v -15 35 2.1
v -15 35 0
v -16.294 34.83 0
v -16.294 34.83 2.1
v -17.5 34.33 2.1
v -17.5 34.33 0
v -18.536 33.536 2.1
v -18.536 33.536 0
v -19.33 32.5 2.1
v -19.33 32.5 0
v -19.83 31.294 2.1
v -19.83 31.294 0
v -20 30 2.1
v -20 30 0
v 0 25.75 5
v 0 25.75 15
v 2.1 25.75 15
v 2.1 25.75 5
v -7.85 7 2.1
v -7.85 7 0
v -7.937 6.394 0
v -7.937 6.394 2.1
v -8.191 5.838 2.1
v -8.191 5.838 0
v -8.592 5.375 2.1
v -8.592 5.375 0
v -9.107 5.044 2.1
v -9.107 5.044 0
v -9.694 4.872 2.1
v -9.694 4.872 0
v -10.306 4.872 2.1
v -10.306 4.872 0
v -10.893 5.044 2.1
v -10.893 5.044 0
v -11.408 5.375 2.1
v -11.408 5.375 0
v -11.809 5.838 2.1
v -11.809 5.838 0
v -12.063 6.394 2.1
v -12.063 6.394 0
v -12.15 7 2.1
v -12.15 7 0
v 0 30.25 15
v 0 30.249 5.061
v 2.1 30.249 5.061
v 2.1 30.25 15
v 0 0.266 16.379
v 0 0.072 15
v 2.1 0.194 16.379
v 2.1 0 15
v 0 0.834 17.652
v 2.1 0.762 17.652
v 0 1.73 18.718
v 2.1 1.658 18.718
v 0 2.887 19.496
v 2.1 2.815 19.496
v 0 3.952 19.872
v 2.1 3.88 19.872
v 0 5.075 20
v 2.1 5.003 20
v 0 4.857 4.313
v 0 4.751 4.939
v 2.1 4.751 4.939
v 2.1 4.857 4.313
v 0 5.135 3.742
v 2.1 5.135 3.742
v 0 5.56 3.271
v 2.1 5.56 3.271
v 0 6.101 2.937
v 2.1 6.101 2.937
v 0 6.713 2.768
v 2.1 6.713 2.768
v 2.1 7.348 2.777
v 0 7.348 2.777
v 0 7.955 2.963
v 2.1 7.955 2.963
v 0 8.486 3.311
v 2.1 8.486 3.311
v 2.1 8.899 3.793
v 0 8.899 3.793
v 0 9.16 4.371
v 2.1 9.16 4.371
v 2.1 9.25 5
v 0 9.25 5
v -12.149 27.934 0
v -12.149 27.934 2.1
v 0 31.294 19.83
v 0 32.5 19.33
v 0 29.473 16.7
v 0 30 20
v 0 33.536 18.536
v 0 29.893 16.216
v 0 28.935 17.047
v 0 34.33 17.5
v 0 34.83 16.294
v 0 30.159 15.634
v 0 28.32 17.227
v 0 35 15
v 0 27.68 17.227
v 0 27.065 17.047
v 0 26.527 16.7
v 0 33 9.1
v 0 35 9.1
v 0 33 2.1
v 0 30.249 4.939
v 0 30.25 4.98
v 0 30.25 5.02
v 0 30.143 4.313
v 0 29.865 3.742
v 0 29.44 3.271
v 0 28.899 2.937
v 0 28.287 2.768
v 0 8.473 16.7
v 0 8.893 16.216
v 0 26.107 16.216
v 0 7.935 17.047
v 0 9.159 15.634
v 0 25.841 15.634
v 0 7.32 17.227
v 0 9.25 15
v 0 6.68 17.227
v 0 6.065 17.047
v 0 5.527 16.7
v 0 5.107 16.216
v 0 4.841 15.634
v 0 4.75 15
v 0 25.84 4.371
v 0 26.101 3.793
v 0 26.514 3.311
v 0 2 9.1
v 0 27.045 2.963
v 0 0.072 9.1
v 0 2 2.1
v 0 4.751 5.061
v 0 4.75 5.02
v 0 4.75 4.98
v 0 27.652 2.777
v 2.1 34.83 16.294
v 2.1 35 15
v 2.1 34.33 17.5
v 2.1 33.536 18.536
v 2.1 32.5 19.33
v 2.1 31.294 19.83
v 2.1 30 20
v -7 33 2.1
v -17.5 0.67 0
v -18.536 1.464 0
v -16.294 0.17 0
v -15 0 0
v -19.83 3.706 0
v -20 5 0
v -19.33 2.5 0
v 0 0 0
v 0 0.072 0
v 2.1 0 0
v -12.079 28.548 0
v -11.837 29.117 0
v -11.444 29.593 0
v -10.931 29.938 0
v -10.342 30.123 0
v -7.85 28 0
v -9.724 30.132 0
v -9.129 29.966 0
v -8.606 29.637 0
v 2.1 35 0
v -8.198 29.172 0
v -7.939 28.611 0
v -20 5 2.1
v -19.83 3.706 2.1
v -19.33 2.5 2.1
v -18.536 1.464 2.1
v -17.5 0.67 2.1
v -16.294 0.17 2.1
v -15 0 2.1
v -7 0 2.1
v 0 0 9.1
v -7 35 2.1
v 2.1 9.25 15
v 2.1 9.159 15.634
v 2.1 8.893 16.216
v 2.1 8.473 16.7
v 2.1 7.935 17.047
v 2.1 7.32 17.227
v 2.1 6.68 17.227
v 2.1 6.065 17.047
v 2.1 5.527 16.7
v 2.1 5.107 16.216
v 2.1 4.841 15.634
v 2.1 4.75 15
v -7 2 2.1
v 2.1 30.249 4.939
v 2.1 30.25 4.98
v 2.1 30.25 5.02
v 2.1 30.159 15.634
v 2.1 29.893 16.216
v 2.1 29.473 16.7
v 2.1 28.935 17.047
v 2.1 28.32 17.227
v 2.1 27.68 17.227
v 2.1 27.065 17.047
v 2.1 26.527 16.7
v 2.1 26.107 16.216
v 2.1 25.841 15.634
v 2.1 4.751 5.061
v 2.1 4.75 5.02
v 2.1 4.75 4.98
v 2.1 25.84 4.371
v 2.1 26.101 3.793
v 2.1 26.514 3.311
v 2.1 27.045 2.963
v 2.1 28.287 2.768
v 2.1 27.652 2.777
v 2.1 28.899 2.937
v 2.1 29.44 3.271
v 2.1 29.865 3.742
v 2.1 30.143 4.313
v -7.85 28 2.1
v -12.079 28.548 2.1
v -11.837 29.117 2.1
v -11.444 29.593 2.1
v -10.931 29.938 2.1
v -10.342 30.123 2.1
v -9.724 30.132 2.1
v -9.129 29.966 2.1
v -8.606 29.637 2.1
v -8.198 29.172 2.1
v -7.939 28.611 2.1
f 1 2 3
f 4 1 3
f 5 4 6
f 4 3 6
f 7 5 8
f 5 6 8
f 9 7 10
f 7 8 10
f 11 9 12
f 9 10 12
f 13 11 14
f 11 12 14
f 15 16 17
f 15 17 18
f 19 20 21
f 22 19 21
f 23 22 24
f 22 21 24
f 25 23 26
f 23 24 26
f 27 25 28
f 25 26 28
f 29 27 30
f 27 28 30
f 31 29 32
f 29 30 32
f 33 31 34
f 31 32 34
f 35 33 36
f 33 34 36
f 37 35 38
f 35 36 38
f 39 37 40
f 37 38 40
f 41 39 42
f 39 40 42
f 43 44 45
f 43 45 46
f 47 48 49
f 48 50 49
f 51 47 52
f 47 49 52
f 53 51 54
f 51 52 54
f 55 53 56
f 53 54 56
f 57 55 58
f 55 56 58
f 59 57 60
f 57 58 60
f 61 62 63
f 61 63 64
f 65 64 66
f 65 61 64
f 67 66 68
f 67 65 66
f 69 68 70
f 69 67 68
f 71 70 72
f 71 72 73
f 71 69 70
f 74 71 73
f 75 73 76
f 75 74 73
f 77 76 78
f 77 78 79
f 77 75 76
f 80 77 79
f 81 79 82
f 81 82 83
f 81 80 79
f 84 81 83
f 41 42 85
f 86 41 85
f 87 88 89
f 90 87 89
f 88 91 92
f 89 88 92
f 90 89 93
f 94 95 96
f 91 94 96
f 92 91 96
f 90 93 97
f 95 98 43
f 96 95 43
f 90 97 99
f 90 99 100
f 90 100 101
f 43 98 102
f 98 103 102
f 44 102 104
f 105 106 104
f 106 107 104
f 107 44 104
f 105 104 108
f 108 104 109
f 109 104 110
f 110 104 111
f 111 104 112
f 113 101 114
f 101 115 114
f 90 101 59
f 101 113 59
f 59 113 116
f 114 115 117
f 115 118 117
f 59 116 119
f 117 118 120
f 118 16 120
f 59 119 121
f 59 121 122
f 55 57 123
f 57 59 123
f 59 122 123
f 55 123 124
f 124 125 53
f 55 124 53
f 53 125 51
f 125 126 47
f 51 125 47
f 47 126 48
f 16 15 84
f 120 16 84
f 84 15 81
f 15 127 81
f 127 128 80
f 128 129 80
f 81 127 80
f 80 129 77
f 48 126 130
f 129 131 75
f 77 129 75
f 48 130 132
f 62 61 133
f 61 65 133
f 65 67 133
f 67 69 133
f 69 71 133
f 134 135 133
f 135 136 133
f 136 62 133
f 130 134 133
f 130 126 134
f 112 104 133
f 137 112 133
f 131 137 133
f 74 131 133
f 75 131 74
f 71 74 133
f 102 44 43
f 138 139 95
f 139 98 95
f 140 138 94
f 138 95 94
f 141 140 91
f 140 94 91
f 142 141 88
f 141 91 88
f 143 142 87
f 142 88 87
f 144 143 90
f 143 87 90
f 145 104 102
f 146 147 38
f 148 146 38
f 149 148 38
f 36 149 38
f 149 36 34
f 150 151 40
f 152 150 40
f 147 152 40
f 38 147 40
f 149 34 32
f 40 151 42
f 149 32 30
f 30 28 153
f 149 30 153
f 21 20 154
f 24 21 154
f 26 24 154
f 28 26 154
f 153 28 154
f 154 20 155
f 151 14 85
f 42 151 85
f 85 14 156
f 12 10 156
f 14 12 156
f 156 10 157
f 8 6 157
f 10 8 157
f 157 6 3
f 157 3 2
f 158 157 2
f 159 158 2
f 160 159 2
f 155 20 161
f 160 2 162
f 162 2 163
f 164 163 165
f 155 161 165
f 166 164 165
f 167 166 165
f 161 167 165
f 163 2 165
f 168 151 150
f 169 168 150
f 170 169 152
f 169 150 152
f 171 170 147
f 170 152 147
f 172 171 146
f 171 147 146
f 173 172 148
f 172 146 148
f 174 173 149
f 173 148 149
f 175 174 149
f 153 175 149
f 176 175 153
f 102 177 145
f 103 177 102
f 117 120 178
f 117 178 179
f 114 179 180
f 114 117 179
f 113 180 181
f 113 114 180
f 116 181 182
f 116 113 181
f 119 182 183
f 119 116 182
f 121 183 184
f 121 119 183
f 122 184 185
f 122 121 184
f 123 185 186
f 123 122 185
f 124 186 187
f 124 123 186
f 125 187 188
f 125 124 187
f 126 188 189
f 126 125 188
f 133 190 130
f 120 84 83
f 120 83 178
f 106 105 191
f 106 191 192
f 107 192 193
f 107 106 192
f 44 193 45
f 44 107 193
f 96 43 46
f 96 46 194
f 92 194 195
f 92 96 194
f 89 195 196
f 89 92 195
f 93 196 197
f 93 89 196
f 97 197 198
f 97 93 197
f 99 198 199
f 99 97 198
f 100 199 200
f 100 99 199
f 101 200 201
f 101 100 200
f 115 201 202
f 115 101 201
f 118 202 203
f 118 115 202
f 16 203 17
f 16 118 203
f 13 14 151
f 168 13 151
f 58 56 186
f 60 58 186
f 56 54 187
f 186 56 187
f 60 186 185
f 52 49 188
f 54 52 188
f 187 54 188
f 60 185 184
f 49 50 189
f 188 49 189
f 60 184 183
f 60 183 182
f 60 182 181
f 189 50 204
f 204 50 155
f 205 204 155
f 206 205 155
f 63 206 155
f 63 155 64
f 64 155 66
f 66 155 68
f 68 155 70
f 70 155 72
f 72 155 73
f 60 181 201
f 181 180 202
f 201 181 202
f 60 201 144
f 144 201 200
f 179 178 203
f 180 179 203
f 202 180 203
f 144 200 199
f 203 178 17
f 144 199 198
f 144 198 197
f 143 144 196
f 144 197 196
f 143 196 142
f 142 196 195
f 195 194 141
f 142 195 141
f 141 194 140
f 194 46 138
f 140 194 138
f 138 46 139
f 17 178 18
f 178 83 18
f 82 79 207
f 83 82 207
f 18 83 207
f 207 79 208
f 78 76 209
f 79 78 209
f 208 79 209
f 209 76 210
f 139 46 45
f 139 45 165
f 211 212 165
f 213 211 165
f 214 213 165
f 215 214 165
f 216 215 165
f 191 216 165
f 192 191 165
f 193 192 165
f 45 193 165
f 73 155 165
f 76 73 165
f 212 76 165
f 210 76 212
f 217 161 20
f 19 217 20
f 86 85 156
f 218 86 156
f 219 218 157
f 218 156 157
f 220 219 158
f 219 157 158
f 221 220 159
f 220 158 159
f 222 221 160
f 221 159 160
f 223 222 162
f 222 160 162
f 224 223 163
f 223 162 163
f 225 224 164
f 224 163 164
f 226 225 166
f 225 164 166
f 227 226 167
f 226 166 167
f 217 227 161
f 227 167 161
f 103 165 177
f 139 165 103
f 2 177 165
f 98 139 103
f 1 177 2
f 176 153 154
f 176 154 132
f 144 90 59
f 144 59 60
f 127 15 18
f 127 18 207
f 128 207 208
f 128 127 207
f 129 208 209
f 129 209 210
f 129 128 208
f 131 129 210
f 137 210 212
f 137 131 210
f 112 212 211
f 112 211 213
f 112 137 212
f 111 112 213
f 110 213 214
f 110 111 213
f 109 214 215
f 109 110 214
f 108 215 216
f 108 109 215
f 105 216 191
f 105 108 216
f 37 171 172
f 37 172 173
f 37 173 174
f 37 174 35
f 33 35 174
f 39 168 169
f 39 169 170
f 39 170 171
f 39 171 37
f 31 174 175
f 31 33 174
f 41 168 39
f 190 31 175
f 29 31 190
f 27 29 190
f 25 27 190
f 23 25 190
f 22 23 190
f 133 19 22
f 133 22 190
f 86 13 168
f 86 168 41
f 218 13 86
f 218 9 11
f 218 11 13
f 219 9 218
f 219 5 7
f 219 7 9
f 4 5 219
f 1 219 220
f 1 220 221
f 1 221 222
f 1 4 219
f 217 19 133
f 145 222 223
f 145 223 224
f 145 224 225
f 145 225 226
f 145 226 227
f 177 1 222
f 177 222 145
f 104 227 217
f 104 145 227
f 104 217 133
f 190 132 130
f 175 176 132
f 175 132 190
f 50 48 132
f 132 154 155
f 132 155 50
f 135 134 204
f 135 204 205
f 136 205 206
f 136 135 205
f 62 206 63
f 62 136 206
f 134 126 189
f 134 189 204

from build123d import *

# Parameters (mm, degrees)
F1_DEPTH  = 2.1
F3_DEPTH  = 20
F5_DEPTH  = 2.1
F6_R      = 5
F8_DEPTH  = 2
F11_DEPTH = 2


with BuildPart() as f1:
    # F0 (on Top) → F1 (new body)
    with BuildSketch(Plane.XY):
        with BuildLine():
            Line((-15, 0), (0, 0))
            Line((0, 0), (0, 35))
            Line((0, 35), (-15, 35))
            ThreePointArc((-15, 35), (-18.5355339059, 33.5355339059), (-20, 30))
            Line((-20, 30), (-20, 5))
            ThreePointArc((-20, 5), (-18.5355339059, 1.4644660941), (-15, 0))
        make_face()
        with BuildLine():
            ThreePointArc((-12.1489869425, 27.9340066588), (-10.0330005573, 30.1497467207), (-7.85, 27.9999999982))
            Line((-7.85, 27.9999999982), (-7.8500000178, 7))
            ThreePointArc((-7.8500000178, 7), (-10.0000000178, 4.85), (-12.1500000178, 7))
            ThreePointArc((-12.1500000178, 7), (-12.1500000172, 7.0000520234), (-12.1500000153, 7.0001040468))
            Line((-12.1500000153, 7.0001040468), (-12.1489869425, 27.9340066588))
        make_face(mode=Mode.SUBTRACT)
    extrude(amount=F1_DEPTH)

    # F2 (on Top) → F3 (join)
    with BuildSketch(Plane.XY):
        Polygon((0, 35), (0, 0.0720546025), (2.1, 0), (2.1, 35), align=None)
    extrude(amount=F3_DEPTH)

    # F4 (on Right) → F5 (cut, through all)
    with BuildSketch(Plane.YZ):
        with BuildLine():
            Line((9.25, 5), (9.25, 15))
            ThreePointArc((9.25, 15), (7, 17.25), (4.75, 15))
            ThreePointArc((4.75, 15), (4.7500000019, 14.9999071898), (4.7500000077, 14.9998143795))
            Line((4.7500000077, 14.9998143795), (4.7508199613, 5.0607384035))
            Line((4.7508199613, 5.0607384035), (4.7508300135, 4.9388904917))
            ThreePointArc((4.7508300135, 4.9388904917), (7.0305575724, 2.750207513), (9.25, 5))
        make_face()
        with BuildLine():
            ThreePointArc((4.7508199613, 5.0607384035), (4.7500000077, 4.9998143795), (4.7508300135, 4.9388904917))
            Line((4.7508300135, 4.9388904917), (4.7508199613, 5.0607384035))
        make_face()
        with BuildLine():
            ThreePointArc((25.75, 5), (27.9694424276, 2.750207513), (30.2491699865, 4.9388904917))
            Line((30.2491699865, 4.9388904917), (30.2491800387, 5.0607384035))
            Line((30.2491800387, 5.0607384035), (30.2499999923, 14.9998143795))
            Line((30.2499999923, 14.9998143795), (30.2500000077, 15))
            ThreePointArc((30.25, 15), (28, 17.25), (25.75, 15))
            Line((25.75, 15), (25.75, 5))
        make_face()
        with BuildLine():
            Line((30.2491800387, 5.0607384035), (30.2491699865, 4.9388904917))
            ThreePointArc((30.2491699865, 4.9388904917), (30.2499999923, 4.9998143795), (30.2491800387, 5.0607384035))
        make_face()
    extrude(amount=F5_DEPTH, mode=Mode.SUBTRACT)

    # F6
    f6_edges = [f1.edges().sort_by_distance(p)[0] for p in [
        (1.05, 35, 20),
        (1.05, 0.036027, 20),
    ]]
    fillet(f6_edges, radius=F6_R)

    # F7 (on Front) → F8 (join)
    with BuildSketch(Plane.XZ):
        Polygon((-7, 2.1), (0, 2.1), (0, 9.1), align=None)
    extrude(amount=-F8_DEPTH)

    # F10 (on offset) → F11 (join)
    with BuildSketch(Plane(origin=(0, 35, 0), x_dir=(-1, 0, 0), z_dir=(0, 1, 0))):
        Polygon((0, 9.1), (0, 2.1), (7, 2.1), align=None)
    extrude(amount=-F11_DEPTH)


solid = f1.part
